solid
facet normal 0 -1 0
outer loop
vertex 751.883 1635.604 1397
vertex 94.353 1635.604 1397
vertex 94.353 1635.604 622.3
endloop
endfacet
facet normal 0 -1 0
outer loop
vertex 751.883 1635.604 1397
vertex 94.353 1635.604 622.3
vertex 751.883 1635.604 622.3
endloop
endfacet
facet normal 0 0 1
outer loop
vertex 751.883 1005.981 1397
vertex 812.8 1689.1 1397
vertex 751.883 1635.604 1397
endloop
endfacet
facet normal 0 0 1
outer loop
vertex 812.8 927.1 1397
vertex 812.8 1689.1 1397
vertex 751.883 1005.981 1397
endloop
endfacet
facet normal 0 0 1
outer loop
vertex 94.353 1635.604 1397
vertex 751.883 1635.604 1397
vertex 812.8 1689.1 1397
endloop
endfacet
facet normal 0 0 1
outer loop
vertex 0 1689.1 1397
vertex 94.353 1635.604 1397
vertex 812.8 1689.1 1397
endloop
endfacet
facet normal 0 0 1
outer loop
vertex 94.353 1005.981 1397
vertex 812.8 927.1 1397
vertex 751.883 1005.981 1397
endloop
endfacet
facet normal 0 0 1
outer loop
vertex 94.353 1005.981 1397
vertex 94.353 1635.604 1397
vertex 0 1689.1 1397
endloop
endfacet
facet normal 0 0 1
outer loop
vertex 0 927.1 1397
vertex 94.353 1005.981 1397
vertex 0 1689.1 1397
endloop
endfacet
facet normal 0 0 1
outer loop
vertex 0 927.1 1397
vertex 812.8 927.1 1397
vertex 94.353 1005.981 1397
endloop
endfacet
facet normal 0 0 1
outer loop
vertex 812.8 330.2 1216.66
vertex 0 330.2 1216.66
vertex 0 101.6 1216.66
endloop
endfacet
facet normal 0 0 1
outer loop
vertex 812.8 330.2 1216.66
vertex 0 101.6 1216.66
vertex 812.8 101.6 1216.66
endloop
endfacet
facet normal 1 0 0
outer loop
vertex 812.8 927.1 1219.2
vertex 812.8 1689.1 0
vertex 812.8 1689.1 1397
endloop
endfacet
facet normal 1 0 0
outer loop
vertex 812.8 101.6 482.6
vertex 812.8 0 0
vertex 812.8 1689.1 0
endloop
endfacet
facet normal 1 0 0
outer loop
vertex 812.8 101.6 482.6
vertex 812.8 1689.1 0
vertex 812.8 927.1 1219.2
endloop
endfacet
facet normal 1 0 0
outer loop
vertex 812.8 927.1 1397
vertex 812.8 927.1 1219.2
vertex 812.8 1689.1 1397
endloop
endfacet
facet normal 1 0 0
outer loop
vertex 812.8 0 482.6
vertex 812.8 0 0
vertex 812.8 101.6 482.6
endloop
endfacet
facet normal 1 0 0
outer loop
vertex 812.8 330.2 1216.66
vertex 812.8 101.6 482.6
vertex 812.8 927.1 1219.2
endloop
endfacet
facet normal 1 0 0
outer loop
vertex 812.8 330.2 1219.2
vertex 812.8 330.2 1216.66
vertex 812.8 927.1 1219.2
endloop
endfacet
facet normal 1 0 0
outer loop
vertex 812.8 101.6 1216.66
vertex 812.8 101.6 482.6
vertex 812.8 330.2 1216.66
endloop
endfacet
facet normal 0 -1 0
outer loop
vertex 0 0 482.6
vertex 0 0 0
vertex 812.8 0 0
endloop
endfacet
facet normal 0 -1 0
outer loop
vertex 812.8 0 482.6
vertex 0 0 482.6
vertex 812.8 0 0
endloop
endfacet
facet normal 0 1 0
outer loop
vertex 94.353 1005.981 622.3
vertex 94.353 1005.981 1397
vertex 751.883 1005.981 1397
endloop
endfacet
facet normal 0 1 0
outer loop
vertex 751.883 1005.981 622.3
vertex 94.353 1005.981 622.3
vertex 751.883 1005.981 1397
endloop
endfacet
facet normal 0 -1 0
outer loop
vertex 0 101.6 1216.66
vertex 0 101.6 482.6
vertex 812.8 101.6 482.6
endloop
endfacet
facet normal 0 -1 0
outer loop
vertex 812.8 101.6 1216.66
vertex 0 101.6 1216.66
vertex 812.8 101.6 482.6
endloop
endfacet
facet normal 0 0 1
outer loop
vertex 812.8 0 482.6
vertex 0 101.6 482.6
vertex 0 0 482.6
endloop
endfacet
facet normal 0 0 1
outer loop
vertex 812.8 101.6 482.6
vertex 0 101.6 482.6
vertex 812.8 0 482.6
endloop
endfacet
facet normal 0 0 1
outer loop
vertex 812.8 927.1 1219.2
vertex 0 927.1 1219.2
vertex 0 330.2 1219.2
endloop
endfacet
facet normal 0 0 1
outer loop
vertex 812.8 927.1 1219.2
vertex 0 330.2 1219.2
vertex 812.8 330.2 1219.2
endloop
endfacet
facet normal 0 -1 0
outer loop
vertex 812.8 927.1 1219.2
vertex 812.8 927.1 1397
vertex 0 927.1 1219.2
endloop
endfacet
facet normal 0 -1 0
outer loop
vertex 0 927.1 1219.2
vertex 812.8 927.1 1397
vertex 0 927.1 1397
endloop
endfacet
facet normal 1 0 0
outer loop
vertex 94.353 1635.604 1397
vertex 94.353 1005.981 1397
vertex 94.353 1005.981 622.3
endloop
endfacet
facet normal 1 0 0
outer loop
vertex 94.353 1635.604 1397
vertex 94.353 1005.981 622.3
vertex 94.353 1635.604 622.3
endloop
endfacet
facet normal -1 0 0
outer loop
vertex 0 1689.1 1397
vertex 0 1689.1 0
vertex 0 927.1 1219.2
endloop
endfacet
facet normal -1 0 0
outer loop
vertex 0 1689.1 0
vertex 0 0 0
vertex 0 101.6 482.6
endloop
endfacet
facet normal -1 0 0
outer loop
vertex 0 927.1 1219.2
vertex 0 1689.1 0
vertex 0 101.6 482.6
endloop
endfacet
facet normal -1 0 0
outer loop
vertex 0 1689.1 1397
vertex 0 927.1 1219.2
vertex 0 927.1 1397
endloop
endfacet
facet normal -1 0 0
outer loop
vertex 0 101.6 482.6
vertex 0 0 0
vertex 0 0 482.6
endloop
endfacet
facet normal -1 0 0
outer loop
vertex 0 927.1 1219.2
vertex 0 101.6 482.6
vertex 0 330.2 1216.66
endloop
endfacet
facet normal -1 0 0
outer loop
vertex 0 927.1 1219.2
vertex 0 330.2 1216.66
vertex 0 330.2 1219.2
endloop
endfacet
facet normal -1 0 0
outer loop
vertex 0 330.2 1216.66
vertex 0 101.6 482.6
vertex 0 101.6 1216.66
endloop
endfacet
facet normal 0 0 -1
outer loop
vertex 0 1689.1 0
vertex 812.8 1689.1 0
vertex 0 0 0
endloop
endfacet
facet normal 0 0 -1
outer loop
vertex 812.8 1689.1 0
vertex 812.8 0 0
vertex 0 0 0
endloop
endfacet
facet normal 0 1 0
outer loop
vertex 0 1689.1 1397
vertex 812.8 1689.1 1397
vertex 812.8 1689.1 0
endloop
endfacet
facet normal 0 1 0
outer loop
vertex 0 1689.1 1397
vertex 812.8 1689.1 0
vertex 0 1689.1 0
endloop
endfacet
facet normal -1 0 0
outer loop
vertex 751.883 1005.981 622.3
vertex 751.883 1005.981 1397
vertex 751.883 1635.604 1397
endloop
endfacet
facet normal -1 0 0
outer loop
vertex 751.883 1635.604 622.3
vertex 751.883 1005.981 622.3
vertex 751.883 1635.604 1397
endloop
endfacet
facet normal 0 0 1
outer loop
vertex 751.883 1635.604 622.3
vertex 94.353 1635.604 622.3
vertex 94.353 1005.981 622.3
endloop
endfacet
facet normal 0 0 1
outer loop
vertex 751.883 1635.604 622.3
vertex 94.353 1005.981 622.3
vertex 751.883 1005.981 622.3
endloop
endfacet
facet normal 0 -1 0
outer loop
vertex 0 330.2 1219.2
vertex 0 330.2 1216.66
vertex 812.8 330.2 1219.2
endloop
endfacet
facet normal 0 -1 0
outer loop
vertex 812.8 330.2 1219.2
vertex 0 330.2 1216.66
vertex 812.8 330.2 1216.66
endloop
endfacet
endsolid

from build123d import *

# Parameters (mm, degrees)
F0_W          = 812.8
F0_H          = 101.6
F1_DEPTH      = 482.6
F2_W          = 812.8
F2_H          = 228.6
F3_DEPTH      = 734.06
F3_DEPTH_BACK = 482.6
F4_W          = 812.8
F4_H          = 596.9
F5_DEPTH      = 1219.2
F6_W          = 812.8
F6_H          = 1397
F7_DEPTH      = 762
F8_W          = 657.52998
F8_H          = 629.62246
F9_DEPTH      = 774.7


with BuildPart() as f1:
    # F0 (on Top) → F1 (new body)
    with BuildSketch(Plane.XY):
        with Locations((406.4, 50.8)):
            Rectangle(F0_W, F0_H)
    extrude(amount=F1_DEPTH)

    # F2 (on face) → F3 (join, two sides)
    with BuildSketch(Plane.XY.offset(482.6)) as f3_sk:
        with Locations((406.4, 215.9)):
            Rectangle(F2_W, F2_H)
    extrude(amount=F3_DEPTH)
    extrude(f3_sk.sketch, amount=-F3_DEPTH_BACK)

    # F4 (on Top) → F5 (join)
    with BuildSketch(Plane.XY):
        with Locations((406.4, 628.65)):
            Rectangle(F4_W, F4_H)
    extrude(amount=F5_DEPTH)

    # F6 (on face) → F7 (join)
    with BuildSketch(Plane(origin=(0, 927.1, 0), x_dir=(-1, 0, 0), z_dir=(0, 1, 0))):
        with Locations((-406.4, 698.5)):
            Rectangle(F6_W, F6_H)
    extrude(amount=F7_DEPTH)

    # F8 (on face) → F9 (cut)
    with BuildSketch(Plane.XY.offset(1397)):
        with Locations((423.118338, 1320.792675)):
            Rectangle(F8_W, F8_H)
    extrude(amount=-F9_DEPTH, mode=Mode.SUBTRACT)


solid = f1.part
